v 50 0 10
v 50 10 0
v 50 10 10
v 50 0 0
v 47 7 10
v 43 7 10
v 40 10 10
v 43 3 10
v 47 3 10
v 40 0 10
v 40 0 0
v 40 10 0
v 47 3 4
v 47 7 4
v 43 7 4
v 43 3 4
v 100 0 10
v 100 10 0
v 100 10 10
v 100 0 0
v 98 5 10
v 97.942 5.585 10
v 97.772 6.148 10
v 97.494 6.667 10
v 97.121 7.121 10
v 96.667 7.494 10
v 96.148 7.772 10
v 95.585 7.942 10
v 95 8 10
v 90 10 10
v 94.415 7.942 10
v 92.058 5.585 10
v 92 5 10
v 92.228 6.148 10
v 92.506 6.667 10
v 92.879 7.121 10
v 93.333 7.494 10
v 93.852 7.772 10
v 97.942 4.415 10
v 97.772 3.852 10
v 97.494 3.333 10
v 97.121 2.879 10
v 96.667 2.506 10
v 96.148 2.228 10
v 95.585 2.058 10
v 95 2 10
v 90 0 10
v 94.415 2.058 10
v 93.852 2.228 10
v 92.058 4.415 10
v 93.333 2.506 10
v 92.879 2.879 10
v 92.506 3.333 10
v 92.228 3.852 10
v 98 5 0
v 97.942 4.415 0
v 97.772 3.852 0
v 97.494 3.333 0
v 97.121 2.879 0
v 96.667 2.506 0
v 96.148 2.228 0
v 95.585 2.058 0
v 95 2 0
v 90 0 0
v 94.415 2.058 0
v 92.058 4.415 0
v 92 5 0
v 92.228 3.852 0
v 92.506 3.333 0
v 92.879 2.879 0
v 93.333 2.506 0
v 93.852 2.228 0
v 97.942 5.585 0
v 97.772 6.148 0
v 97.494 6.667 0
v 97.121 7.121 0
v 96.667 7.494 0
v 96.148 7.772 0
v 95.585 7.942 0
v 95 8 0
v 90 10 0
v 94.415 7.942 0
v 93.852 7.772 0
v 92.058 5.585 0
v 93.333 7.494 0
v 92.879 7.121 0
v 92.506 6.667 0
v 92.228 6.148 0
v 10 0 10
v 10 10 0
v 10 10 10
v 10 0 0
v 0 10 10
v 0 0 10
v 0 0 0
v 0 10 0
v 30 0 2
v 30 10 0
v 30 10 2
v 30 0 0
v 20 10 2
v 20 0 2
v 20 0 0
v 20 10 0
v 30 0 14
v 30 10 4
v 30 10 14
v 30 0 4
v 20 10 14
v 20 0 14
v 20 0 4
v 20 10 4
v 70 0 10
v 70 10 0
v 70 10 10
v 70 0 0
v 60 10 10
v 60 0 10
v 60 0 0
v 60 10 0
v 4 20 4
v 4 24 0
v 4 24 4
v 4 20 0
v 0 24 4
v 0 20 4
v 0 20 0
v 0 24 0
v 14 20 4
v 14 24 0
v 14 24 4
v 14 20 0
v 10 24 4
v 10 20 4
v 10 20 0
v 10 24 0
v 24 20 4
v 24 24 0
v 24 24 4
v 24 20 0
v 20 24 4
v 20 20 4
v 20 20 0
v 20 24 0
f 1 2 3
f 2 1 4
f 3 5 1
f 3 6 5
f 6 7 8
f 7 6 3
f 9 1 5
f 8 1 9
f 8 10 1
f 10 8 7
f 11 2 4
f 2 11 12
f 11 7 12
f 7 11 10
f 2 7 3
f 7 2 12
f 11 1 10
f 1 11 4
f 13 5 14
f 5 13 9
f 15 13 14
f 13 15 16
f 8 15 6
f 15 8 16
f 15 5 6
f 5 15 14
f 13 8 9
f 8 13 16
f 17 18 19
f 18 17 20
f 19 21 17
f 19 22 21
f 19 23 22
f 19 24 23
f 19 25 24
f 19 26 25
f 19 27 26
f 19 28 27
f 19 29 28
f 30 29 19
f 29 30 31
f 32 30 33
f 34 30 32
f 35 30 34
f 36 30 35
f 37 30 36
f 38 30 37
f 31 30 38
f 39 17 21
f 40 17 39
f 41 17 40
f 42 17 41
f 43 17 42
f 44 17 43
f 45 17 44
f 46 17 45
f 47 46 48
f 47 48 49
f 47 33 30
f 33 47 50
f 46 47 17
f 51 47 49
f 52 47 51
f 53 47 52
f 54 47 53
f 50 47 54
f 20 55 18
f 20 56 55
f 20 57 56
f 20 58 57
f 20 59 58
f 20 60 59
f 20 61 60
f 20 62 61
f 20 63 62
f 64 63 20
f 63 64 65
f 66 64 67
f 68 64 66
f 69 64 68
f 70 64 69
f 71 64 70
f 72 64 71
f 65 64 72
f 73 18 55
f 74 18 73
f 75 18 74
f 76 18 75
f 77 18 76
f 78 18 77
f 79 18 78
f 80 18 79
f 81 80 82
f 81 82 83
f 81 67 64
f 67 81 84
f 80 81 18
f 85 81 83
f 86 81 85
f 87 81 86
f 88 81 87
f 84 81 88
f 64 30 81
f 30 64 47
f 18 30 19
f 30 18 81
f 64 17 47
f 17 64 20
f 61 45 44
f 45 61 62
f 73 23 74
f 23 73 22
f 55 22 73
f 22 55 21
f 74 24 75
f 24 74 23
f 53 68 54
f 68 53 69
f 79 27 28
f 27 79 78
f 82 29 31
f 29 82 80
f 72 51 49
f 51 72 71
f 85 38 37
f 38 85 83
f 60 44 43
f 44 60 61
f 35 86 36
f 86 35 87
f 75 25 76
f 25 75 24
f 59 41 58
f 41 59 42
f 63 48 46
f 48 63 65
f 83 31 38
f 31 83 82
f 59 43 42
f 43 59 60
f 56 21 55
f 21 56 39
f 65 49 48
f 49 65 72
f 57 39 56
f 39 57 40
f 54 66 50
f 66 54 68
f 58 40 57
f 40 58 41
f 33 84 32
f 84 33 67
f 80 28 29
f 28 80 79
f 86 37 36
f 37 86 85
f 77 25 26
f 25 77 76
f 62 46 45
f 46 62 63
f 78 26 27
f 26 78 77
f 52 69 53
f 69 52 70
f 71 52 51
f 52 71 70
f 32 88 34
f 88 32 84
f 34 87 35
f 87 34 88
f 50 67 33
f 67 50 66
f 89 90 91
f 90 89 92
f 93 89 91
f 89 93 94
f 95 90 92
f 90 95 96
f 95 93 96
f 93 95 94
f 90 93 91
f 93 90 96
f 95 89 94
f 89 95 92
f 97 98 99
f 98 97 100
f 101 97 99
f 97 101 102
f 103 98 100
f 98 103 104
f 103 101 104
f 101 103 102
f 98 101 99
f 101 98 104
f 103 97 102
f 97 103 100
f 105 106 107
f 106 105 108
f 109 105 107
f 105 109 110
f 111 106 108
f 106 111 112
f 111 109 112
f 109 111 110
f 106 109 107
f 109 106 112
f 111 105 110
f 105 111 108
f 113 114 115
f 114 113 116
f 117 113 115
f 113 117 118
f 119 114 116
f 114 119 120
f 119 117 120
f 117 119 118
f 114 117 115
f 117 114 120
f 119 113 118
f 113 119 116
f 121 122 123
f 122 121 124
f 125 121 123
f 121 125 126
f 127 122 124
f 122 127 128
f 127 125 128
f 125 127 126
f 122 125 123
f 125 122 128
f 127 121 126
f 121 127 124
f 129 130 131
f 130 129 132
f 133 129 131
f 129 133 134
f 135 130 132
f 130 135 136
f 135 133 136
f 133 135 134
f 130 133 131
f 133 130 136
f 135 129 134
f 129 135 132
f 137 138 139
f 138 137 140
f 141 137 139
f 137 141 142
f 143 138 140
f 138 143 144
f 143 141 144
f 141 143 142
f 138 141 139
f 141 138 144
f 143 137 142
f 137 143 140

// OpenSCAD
// Original CanvasNet test fixture: transparency. Every solid is a 10 x 10 x 10 cube at y 0..10 unless noted, and
// the picture is meant to be viewed from above (the top face of most cubes is at z = 10).
//
// Row y 0..10, left to right:
//   x   0..10  a translucent red cube alone (alpha 0.5)
//   x  20..30  a translucent lime cube at z 4..14 floating over an opaque blue plate at z 0..2
//   x  40..50  a translucent red cube with a blind square cavity cut from the top (z 4..10)
//   x  60..70  an orange cube with a ghost (%) passing through its top, which is NOT cut by the ghost
//   x  75..85  a ghost (%) cube beside it
//   x  90..100 a cube with a round through hole, the cutter highlighted with #
// Row y 20..28:
//   x   0..4   color given as a vector with alpha
//   x  10..14  color given as a hex string with alpha
//   x  20..24  color given by name with the alpha argument
//   x  40..48  a ghost (%) of an extruded circle
color([1, 0, 0, 0.5]) cube(10);

color("blue") translate([20, 0, 0]) cube([10, 10, 2]);
color("lime", 0.5) translate([20, 0, 4]) cube(10);

difference() {
  color("red", alpha = 0.5) translate([40, 0, 0]) cube(10);
  translate([43, 3, 4]) cube([4, 4, 7]);
}

color("orange") difference() {
  translate([60, 0, 0]) cube(10);
  %translate([62, 2, 2]) cube([6, 6, 12]);
}
%translate([75, 0, 0]) cube(10);

difference() {
  translate([90, 0, 0]) cube(10);
  #translate([95, 5, -1]) cylinder(h = 12, r = 3, $fn = 32);
}

color([0, 0, 1, 0.5]) translate([0, 20, 0]) cube(4);
color("#ff000080") translate([10, 20, 0]) cube(4);
color("lime", alpha = 0.5) translate([20, 20, 0]) cube(4);
%translate([44, 24, 0]) linear_extrude(height = 4) circle(r = 4, $fn = 24);
